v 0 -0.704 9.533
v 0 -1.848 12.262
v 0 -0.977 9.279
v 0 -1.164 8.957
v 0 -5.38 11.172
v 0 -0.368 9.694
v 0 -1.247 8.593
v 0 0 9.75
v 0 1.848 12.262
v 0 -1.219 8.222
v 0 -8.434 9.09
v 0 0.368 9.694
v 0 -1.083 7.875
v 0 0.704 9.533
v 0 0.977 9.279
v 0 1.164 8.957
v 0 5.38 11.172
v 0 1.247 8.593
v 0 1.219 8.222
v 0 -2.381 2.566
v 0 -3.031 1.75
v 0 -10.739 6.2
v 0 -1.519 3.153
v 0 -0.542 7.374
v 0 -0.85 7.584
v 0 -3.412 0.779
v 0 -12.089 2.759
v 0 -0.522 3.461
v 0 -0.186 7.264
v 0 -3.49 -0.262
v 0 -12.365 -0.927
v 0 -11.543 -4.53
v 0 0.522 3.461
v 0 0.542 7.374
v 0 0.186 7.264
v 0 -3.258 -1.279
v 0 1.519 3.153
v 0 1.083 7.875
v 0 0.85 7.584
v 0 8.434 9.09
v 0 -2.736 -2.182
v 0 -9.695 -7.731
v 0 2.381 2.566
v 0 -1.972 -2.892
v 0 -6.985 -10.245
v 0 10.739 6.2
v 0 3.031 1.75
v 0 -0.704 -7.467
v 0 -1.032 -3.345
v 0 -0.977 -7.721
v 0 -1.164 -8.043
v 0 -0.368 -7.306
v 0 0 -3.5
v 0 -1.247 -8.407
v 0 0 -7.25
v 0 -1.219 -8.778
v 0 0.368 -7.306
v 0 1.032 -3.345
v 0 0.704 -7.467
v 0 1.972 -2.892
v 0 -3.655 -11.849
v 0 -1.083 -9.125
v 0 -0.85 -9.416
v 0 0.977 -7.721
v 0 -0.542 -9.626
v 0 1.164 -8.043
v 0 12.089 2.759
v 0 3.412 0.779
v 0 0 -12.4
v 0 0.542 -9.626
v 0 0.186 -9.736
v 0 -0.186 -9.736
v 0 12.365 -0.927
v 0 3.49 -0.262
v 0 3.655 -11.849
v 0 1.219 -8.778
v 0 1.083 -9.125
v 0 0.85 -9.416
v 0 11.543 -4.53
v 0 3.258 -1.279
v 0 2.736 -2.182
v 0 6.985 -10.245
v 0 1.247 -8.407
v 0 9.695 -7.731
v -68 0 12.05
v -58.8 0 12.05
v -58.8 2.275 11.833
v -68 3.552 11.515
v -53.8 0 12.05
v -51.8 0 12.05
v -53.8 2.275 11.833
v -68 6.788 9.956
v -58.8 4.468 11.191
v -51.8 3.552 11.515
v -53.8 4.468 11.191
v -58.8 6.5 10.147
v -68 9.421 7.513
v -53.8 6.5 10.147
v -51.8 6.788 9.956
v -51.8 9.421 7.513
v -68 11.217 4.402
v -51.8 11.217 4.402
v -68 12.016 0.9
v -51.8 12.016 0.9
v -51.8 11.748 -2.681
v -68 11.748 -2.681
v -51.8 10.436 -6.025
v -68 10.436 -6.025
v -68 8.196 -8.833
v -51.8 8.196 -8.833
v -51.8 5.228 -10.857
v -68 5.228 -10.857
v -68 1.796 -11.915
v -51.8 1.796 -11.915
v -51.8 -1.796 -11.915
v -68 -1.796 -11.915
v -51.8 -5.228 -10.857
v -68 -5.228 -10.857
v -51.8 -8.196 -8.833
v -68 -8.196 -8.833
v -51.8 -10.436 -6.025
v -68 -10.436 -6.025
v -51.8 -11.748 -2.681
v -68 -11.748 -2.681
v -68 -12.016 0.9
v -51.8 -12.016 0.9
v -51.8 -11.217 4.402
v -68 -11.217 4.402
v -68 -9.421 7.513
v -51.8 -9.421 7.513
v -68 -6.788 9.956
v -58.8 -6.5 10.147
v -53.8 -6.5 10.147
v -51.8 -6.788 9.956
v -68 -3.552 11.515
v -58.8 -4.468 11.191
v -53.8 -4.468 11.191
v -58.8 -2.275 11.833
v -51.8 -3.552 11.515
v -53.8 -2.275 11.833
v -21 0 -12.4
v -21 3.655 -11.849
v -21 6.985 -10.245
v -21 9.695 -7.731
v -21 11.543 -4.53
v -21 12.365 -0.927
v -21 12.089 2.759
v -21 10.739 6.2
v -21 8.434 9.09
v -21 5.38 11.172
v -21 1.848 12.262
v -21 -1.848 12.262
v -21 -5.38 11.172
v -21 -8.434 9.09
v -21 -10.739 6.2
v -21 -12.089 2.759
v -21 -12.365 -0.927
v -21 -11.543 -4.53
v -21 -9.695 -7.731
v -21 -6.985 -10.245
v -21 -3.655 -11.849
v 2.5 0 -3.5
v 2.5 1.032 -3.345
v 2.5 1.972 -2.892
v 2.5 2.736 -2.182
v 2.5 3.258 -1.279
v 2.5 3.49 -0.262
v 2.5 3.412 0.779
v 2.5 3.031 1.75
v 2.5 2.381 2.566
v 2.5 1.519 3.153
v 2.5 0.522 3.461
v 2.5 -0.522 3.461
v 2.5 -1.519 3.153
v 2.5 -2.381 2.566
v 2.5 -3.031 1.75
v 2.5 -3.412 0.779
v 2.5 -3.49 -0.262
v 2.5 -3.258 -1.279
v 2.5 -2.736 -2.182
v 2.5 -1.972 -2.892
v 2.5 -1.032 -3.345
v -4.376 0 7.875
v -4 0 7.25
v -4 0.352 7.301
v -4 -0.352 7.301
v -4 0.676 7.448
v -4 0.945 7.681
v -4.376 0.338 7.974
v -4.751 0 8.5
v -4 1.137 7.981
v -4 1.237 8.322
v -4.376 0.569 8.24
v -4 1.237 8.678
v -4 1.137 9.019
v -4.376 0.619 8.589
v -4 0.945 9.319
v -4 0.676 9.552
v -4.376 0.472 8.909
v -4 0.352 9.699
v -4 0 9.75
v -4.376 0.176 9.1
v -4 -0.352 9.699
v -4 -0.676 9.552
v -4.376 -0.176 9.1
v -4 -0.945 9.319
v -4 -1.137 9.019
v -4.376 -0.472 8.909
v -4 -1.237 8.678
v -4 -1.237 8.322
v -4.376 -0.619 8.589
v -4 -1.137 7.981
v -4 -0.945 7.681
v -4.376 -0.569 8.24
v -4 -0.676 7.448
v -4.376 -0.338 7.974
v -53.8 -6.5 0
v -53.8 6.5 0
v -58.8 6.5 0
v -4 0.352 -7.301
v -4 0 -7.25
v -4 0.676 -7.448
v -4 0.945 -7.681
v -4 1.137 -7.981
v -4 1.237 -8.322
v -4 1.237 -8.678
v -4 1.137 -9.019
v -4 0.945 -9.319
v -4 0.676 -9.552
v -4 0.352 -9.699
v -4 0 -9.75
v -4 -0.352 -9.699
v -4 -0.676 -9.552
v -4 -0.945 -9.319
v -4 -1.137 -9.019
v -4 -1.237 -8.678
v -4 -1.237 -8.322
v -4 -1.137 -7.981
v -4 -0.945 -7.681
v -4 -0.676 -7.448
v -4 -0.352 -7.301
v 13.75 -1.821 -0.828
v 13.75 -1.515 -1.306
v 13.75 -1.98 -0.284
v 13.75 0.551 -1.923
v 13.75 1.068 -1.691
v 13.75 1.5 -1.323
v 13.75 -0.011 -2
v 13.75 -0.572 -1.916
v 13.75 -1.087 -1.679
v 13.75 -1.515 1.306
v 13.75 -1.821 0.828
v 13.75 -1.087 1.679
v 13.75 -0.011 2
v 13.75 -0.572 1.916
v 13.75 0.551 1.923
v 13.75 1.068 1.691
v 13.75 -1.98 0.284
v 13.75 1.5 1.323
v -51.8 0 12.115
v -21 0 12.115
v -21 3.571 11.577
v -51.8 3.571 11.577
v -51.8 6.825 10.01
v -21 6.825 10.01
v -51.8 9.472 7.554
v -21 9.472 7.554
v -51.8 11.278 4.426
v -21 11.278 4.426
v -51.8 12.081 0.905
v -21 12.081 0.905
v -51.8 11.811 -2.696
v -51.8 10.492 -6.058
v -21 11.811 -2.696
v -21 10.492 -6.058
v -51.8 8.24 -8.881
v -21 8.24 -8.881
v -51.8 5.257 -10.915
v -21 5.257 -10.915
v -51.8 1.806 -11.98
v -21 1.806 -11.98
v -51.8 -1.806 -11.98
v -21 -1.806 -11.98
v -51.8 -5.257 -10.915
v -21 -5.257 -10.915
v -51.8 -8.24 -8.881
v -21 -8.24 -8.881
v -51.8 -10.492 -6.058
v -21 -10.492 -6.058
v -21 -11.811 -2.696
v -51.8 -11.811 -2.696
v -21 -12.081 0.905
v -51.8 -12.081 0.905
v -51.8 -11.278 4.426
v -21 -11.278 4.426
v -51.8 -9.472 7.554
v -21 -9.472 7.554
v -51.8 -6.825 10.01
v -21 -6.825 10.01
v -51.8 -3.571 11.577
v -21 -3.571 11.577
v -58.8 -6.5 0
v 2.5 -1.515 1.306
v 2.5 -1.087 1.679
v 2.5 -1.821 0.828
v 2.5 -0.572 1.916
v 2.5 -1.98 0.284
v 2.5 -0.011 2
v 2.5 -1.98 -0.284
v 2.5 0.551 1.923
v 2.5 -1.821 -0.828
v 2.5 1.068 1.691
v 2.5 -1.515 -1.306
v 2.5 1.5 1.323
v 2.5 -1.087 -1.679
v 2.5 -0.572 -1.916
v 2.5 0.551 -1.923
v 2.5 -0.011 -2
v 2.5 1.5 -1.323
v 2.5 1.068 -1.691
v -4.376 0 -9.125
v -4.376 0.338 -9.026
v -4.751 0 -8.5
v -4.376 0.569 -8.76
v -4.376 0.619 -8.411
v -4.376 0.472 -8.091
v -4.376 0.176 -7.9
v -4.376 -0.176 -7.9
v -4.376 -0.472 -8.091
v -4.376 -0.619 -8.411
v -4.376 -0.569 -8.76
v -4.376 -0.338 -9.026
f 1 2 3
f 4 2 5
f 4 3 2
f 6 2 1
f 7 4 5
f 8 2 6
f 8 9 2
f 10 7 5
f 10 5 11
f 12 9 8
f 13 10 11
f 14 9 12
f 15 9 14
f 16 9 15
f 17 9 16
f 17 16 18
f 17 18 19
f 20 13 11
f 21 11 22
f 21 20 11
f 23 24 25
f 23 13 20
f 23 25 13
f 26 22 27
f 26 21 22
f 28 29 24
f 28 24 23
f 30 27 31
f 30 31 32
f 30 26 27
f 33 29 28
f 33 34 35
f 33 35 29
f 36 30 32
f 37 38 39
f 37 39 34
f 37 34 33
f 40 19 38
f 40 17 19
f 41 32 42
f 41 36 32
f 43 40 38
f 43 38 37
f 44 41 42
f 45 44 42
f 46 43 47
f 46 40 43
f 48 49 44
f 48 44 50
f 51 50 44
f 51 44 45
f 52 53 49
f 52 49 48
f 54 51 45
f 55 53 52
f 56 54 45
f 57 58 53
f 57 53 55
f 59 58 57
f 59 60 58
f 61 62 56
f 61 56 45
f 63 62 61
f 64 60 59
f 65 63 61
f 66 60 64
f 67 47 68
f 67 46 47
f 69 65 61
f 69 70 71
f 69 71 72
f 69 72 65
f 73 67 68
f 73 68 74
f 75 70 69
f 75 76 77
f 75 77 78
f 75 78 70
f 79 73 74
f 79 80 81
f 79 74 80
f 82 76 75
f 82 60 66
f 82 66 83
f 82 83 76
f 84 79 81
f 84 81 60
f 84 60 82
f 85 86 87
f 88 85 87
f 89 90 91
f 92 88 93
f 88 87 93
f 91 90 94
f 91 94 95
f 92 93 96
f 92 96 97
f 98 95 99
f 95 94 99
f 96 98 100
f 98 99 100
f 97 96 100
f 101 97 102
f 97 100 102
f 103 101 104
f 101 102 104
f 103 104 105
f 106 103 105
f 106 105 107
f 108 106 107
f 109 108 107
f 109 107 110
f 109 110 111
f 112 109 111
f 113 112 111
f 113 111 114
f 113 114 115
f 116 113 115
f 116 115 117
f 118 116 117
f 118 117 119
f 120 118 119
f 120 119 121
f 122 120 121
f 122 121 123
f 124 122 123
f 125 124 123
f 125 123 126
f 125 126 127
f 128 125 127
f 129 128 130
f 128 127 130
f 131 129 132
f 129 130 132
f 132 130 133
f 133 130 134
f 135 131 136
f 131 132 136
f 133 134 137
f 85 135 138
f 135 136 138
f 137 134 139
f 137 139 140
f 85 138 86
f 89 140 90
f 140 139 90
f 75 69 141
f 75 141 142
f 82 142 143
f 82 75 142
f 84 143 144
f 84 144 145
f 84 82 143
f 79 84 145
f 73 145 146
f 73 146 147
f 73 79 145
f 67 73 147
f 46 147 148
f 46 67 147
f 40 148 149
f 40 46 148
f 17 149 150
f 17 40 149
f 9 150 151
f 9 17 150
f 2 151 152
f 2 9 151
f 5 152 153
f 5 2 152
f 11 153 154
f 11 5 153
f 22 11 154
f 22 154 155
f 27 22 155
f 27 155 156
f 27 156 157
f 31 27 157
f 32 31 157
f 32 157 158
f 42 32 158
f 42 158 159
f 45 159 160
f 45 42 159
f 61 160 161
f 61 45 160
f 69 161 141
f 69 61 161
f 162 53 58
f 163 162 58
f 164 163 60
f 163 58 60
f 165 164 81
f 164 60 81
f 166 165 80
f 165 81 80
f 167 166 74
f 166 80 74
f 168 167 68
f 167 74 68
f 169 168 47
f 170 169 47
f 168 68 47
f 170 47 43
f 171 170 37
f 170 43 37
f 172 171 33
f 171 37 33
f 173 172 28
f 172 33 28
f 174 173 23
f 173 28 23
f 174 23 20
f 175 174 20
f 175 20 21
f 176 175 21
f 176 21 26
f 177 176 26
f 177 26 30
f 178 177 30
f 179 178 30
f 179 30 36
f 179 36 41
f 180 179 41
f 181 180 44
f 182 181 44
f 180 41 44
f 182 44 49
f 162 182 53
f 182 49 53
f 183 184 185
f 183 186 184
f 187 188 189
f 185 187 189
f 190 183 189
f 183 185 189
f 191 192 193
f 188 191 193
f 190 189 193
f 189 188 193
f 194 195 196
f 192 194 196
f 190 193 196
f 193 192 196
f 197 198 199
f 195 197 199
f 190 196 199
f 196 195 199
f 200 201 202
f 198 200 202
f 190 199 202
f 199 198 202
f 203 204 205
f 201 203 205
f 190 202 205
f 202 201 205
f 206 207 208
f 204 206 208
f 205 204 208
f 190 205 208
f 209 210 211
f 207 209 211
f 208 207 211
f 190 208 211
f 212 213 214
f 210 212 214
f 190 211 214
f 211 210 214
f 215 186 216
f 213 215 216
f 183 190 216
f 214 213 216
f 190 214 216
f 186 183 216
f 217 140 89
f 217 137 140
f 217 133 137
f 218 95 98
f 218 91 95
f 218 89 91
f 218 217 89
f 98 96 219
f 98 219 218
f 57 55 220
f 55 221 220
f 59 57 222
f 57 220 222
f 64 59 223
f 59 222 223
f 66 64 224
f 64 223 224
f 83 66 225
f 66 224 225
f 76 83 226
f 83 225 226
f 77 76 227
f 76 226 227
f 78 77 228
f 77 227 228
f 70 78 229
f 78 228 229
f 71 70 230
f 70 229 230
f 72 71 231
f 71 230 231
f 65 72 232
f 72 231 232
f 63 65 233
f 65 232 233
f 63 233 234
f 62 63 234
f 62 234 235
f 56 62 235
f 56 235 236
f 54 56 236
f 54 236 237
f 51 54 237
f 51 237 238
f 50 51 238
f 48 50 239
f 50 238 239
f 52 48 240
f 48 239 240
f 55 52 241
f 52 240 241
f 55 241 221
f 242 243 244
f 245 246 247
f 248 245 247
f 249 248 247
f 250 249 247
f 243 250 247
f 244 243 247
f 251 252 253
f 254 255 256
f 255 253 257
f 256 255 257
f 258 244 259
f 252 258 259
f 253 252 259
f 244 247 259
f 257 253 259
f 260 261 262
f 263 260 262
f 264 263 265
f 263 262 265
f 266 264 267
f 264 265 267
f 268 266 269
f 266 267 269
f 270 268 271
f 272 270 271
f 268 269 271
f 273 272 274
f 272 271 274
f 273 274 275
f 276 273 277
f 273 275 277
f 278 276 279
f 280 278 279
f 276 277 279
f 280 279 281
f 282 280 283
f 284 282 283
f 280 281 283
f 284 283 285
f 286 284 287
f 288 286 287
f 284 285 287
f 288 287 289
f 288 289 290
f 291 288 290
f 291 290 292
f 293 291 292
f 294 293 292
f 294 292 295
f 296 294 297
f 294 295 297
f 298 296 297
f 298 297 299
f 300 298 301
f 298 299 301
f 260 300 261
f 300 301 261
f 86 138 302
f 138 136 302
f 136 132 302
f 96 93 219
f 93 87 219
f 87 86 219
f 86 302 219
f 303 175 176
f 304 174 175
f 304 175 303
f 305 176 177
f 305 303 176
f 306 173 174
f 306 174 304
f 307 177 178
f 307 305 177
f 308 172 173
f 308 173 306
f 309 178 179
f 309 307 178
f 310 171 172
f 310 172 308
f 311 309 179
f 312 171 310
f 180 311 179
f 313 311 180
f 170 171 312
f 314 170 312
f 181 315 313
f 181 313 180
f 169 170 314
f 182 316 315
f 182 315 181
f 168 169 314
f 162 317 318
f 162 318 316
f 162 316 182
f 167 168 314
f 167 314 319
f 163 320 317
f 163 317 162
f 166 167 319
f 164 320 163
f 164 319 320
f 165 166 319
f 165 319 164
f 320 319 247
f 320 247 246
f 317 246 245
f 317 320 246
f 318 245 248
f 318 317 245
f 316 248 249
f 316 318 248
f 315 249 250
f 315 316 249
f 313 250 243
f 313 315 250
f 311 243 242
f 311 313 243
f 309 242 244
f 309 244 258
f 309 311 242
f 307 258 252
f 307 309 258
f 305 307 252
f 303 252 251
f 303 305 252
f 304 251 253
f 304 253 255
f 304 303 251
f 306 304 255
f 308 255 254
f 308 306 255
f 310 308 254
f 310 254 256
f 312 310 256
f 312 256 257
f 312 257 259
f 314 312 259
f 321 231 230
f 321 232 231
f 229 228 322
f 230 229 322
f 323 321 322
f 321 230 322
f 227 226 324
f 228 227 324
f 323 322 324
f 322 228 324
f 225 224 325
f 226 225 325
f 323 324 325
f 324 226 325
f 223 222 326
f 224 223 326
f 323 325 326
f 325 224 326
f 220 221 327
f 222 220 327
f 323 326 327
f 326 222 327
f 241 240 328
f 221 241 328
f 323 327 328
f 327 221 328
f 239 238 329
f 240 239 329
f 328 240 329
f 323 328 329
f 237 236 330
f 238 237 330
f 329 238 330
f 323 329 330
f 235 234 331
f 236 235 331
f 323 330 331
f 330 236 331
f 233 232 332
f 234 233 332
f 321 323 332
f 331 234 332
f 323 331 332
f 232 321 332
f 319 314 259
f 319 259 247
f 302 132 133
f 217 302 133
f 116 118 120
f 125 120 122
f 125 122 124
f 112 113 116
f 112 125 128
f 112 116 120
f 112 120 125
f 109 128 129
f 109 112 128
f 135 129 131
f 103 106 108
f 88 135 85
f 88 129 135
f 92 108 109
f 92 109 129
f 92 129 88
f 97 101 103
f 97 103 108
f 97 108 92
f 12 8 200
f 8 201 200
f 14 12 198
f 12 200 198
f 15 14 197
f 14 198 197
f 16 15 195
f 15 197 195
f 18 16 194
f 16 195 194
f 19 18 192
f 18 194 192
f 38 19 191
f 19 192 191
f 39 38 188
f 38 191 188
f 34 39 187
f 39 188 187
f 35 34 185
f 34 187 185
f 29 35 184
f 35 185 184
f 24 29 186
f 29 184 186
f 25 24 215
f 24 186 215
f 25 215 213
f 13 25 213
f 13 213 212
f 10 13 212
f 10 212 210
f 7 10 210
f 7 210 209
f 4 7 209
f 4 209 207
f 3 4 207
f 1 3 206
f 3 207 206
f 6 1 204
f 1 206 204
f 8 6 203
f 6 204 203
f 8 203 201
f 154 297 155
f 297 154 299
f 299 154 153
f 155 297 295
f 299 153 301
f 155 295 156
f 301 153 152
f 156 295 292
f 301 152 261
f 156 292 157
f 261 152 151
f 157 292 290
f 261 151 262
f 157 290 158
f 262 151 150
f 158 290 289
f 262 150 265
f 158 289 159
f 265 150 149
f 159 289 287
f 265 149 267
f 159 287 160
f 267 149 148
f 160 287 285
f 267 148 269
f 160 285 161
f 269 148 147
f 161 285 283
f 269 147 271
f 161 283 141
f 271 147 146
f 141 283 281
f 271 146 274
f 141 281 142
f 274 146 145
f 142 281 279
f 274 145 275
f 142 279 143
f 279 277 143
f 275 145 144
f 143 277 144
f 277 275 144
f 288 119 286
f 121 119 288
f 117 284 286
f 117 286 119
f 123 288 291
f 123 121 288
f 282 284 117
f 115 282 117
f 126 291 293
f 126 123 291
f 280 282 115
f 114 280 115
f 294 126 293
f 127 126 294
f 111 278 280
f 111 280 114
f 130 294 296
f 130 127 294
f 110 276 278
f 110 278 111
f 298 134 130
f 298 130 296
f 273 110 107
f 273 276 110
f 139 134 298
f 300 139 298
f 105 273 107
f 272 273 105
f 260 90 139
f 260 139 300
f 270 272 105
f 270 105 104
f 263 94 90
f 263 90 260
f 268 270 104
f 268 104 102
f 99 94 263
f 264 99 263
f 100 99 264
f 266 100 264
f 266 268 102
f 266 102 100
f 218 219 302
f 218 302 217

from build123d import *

# Parameters (mm, degrees)
SKETCH1_R                 = 12.4
BOSS_EXTRUDE2_DEPTH       = 21
SKETCH3_R                 = 12.115
BOSS_EXTRUDE3_DEPTH       = 30.8
SKETCH4_R                 = 12.05
BOSS_EXTRUDE4_DEPTH       = 16.2
SKETCH5_R                 = 3.5
BOSS_EXTRUDE5_DEPTH       = 2.5
BOSS_EXTRUDE6_DEPTH       = 11.25
M3X0_5_TAPPED_HOLE1_D     = 2.5
M3X0_5_TAPPED_HOLE1_DEPTH = 4
M3X0_5_TAPPED_HOLE1_TIP   = 0.751075774
SKETCH9_W                 = 5
SKETCH9_H                 = 13
CUT_EXTRUDE2_DEPTH        = 13.4


with BuildPart() as part:
    # Sketch1 → Boss-Extrude2 (new body)
    with BuildSketch(Plane(origin=(0, 0, 0), x_dir=(0, 0, -1), z_dir=(1, 0, 0))):
        Circle(SKETCH1_R)
    extrude(amount=-BOSS_EXTRUDE2_DEPTH)

    # Sketch3 → Boss-Extrude3 (add)
    with BuildSketch(Plane.ZY.offset(21)):
        Circle(SKETCH3_R)
    extrude(amount=BOSS_EXTRUDE3_DEPTH)

    # Sketch4 → Boss-Extrude4 (add)
    with BuildSketch(Plane.ZY.offset(51.8)):
        Circle(SKETCH4_R)
    extrude(amount=BOSS_EXTRUDE4_DEPTH)

    # Sketch5 → Boss-Extrude5 (add)
    with BuildSketch(Plane(origin=(0, 0, 0), x_dir=(0, 0, -1), z_dir=(1, 0, 0))):
        Circle(SKETCH5_R)
    extrude(amount=BOSS_EXTRUDE5_DEPTH)

    # Sketch6 → Boss-Extrude6 (add)
    with BuildSketch(Plane(origin=(2.5, 0, 0), x_dir=(0, 0, -1), z_dir=(1, 0, 0))):
        with BuildLine():
            Line((-1.322875656, 1.5), (1.322875656, 1.5))
            ThreePointArc((1.322875656, 1.5), (0, -2), (-1.322875656, 1.5))
        make_face()
    extrude(amount=BOSS_EXTRUDE6_DEPTH)

    # M3x0.5 Tapped Hole1
    with Locations(Plane(origin=(0, 0, 0), x_dir=(0, 0, -1), z_dir=(1, 0, 0))):
        with Locations((-8.5, 0), (8.5, 0)):
            Hole(M3X0_5_TAPPED_HOLE1_D / 2, depth=M3X0_5_TAPPED_HOLE1_DEPTH)
            with Locations((0, 0, -(M3X0_5_TAPPED_HOLE1_DEPTH + M3X0_5_TAPPED_HOLE1_TIP / 2))):  # 118° drill point
                Cone(0, M3X0_5_TAPPED_HOLE1_D / 2, M3X0_5_TAPPED_HOLE1_TIP, mode=Mode.SUBTRACT)

    # Sketch9 → Cut-Extrude2 (cut, through all)
    with BuildSketch(Plane.XY):
        with Locations((-56.3, 0)):
            Rectangle(SKETCH9_W, SKETCH9_H)
    extrude(amount=CUT_EXTRUDE2_DEPTH, mode=Mode.SUBTRACT)


solid = part.part
